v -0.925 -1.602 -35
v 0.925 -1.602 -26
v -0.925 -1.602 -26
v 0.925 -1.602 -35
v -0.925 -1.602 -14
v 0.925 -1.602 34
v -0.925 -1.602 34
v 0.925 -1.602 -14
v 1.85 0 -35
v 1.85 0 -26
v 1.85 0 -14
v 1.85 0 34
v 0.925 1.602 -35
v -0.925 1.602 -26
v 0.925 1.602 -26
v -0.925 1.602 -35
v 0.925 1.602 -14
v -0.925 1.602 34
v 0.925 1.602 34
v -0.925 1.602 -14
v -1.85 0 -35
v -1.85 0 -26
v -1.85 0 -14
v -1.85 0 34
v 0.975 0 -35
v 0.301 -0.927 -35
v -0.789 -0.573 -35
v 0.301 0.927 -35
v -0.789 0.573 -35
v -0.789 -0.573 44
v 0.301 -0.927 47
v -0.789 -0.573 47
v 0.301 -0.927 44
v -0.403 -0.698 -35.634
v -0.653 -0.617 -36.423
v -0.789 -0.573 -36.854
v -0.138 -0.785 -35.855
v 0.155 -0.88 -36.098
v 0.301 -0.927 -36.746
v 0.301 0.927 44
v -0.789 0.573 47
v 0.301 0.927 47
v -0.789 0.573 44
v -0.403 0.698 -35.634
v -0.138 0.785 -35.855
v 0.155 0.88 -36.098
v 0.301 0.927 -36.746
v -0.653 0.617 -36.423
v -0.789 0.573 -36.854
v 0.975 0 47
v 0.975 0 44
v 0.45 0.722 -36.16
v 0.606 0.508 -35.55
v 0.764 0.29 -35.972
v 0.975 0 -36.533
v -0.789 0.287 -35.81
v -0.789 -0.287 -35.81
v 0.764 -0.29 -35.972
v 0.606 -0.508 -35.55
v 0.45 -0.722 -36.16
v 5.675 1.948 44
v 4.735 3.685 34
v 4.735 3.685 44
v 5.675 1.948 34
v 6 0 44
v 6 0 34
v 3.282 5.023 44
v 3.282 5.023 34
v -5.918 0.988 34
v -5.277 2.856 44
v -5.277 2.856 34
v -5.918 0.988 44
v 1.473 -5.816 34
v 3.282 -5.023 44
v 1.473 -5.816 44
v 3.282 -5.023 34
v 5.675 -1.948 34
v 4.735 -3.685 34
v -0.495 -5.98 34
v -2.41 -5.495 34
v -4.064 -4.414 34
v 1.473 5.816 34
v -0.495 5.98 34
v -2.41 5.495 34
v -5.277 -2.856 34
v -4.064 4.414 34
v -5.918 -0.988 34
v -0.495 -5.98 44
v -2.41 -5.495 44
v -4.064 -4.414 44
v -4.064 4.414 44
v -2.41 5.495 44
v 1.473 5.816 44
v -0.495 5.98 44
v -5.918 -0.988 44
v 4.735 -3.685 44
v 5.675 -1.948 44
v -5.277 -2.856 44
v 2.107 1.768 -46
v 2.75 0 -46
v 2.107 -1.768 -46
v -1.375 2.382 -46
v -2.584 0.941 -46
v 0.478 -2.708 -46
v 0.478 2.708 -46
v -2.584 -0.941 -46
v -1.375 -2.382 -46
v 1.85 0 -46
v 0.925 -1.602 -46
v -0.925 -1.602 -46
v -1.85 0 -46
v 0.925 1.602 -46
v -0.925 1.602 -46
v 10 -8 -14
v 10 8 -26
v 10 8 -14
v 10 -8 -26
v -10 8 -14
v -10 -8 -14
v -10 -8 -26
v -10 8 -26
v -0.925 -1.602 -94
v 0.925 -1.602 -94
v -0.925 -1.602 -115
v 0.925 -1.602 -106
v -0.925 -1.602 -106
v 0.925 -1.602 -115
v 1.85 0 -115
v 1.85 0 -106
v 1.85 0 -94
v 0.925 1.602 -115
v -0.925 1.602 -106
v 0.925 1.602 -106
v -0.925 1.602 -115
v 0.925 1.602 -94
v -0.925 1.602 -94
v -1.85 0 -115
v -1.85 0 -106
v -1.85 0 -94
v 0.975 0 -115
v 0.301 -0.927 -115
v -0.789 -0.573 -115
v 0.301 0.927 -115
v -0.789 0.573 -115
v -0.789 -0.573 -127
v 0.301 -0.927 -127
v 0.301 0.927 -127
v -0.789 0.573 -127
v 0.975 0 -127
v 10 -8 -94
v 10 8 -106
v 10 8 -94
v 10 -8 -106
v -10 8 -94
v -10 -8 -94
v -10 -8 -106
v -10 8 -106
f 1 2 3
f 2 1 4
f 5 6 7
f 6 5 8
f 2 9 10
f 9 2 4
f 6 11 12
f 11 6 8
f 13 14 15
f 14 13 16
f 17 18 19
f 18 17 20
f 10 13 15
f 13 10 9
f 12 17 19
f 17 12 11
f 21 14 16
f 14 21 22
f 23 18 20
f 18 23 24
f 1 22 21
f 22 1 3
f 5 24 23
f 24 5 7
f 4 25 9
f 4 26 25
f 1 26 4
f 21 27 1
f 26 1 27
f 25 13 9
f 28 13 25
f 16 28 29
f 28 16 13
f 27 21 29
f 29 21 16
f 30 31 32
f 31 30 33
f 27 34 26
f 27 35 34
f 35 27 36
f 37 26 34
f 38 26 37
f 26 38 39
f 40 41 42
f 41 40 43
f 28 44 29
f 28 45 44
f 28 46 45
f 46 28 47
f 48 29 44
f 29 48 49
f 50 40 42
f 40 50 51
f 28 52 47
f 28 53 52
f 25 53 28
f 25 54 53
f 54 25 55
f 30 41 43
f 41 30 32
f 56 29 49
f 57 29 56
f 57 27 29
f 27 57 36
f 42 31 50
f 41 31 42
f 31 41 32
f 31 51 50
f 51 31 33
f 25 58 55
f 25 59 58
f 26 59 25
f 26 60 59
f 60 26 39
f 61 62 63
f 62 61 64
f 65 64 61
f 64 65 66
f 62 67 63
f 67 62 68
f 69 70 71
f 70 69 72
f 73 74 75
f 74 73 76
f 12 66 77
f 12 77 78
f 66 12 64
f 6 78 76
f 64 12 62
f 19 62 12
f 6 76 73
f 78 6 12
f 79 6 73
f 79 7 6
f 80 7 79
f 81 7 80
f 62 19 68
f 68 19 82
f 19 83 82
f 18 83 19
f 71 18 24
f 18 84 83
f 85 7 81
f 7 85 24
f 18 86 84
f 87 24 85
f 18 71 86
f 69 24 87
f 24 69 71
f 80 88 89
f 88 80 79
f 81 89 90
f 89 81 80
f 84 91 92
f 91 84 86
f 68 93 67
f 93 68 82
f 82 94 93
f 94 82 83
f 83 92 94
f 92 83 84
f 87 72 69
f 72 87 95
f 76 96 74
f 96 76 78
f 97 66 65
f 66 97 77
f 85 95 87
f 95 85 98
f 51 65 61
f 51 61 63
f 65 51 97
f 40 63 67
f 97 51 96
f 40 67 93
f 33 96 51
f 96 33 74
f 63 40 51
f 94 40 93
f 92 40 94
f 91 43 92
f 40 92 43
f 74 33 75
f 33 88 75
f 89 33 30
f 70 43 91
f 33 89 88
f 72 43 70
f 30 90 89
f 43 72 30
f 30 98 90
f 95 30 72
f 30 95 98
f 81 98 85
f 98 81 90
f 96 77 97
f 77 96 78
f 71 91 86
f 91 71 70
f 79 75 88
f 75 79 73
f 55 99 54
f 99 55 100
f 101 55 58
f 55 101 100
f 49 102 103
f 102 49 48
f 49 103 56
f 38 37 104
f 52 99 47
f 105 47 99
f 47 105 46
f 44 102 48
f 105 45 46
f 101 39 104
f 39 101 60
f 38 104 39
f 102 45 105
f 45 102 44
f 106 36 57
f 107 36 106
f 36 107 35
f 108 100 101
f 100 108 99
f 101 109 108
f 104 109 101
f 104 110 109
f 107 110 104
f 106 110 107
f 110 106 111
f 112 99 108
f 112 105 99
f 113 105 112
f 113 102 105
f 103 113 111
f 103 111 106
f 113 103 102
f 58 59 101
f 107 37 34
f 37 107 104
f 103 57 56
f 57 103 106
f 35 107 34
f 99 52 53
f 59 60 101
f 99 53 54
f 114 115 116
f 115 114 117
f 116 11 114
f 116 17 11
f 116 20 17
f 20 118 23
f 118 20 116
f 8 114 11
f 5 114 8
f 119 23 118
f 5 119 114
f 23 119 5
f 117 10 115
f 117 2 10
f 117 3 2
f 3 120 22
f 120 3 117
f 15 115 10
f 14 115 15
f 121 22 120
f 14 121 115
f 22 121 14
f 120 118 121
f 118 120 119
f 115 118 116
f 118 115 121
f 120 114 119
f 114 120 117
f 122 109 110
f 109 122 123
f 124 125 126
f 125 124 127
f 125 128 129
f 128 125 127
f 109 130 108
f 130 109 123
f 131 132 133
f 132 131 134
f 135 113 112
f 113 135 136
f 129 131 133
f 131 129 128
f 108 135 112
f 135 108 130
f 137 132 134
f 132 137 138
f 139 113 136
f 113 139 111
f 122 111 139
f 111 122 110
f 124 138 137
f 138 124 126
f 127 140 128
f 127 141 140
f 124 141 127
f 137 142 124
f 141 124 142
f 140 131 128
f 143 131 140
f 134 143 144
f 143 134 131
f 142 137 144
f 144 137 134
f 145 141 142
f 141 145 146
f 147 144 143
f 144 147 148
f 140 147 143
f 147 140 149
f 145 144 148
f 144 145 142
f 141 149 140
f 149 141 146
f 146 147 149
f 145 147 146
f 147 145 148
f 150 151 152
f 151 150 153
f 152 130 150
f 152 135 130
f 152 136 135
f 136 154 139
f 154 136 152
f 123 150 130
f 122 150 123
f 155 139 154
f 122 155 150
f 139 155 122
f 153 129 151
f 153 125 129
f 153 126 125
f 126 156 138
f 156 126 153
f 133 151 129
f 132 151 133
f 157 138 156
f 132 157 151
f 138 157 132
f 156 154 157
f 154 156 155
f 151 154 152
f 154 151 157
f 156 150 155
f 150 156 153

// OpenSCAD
// Parameters
total_length_mm = 70; //[35:140:1]
barrel_diameter_mm = 3.7; //[1.85:7.4:0.05]
filament_diameter_mm = 1.75; //[1.5:3:0.05]
filament_bore_clearance_mm = 0.2; //[0.05:0.6:0.05]
filament_bore_diameter_mm = 1.95; //[1.6:3.2:0.05]
default_wall_thickness_mm = 0.9; //[0.45:1.8:0.05]
connect_overlap_mm = 1; //[0.5:2:0.1]
mount_length_mm = 10; //[5:20:1]
mount_diameter_mm = 12; //[6:24:0.5]
nozzle_length_mm = 12; //[6:24:1]
nozzle_tip_diameter_mm = 1; //[0.4:3:0.05]
heater_block_size_x_mm = 20; //[10:40:1]
heater_block_size_y_mm = 16; //[8:32:1]
heater_block_size_z_mm = 12; //[6:24:1]
heater_block_center_z_mm = -20; //[-50:0:1]

// Hot End - complete geometry
module hot_end() {
  color("DimGray") {
    // Barrel
    cylinder(h=total_length_mm, r=barrel_diameter_mm/2, center=true);
    // Filament Bore
    color("White")
    translate([0, 0, 0])
      cylinder(h=total_length_mm + mount_length_mm + nozzle_length_mm + 2*connect_overlap_mm, 
               r=filament_bore_diameter_mm/2, center=true);
  }
}

// E3D Hot End Assembly - complete geometry
module e3d_hot_end_assembly() {
  color("Black") {
    // Mount Interface
    translate([0, 0, total_length_mm/2 + mount_length_mm/2 - connect_overlap_mm])
      cylinder(h=mount_length_mm, r=mount_diameter_mm/2, center=true);
    // Nozzle
    translate([0, 0, -total_length_mm/2 - nozzle_length_mm/2 + connect_overlap_mm])
      cylinder(h=nozzle_length_mm, r1=barrel_diameter_mm/2 + default_wall_thickness_mm, 
               r2=nozzle_tip_diameter_mm/2, center=true);
    // Heater Block
    translate([0, 0, heater_block_center_z_mm])
      cube([heater_block_size_x_mm, heater_block_size_y_mm, heater_block_size_z_mm], center=true);
  }
}

// E3D Hot End - complete geometry
module e3d_hot_end() {
  hot_end();
  e3d_hot_end_assembly();
}

// Jhead Hot End Assembly - complete geometry
module jhead_hot_end_assembly() {
  color("Silver") {
    // Placeholder for Jhead specific geometry
    // This can be expanded with more detailed geometry if needed
    translate([0, 0, heater_block_center_z_mm])
      cube([heater_block_size_x_mm, heater_block_size_y_mm, heater_block_size_z_mm], center=true);
  }
}

// Jhead Hot End - complete geometry
module jhead_hot_end() {
  hot_end();
  jhead_hot_end_assembly();
}

// Assembly
module assembly() {
  e3d_hot_end();
  translate([0, 0, -total_length_mm - 10]) jhead_hot_end();
}

assembly();
